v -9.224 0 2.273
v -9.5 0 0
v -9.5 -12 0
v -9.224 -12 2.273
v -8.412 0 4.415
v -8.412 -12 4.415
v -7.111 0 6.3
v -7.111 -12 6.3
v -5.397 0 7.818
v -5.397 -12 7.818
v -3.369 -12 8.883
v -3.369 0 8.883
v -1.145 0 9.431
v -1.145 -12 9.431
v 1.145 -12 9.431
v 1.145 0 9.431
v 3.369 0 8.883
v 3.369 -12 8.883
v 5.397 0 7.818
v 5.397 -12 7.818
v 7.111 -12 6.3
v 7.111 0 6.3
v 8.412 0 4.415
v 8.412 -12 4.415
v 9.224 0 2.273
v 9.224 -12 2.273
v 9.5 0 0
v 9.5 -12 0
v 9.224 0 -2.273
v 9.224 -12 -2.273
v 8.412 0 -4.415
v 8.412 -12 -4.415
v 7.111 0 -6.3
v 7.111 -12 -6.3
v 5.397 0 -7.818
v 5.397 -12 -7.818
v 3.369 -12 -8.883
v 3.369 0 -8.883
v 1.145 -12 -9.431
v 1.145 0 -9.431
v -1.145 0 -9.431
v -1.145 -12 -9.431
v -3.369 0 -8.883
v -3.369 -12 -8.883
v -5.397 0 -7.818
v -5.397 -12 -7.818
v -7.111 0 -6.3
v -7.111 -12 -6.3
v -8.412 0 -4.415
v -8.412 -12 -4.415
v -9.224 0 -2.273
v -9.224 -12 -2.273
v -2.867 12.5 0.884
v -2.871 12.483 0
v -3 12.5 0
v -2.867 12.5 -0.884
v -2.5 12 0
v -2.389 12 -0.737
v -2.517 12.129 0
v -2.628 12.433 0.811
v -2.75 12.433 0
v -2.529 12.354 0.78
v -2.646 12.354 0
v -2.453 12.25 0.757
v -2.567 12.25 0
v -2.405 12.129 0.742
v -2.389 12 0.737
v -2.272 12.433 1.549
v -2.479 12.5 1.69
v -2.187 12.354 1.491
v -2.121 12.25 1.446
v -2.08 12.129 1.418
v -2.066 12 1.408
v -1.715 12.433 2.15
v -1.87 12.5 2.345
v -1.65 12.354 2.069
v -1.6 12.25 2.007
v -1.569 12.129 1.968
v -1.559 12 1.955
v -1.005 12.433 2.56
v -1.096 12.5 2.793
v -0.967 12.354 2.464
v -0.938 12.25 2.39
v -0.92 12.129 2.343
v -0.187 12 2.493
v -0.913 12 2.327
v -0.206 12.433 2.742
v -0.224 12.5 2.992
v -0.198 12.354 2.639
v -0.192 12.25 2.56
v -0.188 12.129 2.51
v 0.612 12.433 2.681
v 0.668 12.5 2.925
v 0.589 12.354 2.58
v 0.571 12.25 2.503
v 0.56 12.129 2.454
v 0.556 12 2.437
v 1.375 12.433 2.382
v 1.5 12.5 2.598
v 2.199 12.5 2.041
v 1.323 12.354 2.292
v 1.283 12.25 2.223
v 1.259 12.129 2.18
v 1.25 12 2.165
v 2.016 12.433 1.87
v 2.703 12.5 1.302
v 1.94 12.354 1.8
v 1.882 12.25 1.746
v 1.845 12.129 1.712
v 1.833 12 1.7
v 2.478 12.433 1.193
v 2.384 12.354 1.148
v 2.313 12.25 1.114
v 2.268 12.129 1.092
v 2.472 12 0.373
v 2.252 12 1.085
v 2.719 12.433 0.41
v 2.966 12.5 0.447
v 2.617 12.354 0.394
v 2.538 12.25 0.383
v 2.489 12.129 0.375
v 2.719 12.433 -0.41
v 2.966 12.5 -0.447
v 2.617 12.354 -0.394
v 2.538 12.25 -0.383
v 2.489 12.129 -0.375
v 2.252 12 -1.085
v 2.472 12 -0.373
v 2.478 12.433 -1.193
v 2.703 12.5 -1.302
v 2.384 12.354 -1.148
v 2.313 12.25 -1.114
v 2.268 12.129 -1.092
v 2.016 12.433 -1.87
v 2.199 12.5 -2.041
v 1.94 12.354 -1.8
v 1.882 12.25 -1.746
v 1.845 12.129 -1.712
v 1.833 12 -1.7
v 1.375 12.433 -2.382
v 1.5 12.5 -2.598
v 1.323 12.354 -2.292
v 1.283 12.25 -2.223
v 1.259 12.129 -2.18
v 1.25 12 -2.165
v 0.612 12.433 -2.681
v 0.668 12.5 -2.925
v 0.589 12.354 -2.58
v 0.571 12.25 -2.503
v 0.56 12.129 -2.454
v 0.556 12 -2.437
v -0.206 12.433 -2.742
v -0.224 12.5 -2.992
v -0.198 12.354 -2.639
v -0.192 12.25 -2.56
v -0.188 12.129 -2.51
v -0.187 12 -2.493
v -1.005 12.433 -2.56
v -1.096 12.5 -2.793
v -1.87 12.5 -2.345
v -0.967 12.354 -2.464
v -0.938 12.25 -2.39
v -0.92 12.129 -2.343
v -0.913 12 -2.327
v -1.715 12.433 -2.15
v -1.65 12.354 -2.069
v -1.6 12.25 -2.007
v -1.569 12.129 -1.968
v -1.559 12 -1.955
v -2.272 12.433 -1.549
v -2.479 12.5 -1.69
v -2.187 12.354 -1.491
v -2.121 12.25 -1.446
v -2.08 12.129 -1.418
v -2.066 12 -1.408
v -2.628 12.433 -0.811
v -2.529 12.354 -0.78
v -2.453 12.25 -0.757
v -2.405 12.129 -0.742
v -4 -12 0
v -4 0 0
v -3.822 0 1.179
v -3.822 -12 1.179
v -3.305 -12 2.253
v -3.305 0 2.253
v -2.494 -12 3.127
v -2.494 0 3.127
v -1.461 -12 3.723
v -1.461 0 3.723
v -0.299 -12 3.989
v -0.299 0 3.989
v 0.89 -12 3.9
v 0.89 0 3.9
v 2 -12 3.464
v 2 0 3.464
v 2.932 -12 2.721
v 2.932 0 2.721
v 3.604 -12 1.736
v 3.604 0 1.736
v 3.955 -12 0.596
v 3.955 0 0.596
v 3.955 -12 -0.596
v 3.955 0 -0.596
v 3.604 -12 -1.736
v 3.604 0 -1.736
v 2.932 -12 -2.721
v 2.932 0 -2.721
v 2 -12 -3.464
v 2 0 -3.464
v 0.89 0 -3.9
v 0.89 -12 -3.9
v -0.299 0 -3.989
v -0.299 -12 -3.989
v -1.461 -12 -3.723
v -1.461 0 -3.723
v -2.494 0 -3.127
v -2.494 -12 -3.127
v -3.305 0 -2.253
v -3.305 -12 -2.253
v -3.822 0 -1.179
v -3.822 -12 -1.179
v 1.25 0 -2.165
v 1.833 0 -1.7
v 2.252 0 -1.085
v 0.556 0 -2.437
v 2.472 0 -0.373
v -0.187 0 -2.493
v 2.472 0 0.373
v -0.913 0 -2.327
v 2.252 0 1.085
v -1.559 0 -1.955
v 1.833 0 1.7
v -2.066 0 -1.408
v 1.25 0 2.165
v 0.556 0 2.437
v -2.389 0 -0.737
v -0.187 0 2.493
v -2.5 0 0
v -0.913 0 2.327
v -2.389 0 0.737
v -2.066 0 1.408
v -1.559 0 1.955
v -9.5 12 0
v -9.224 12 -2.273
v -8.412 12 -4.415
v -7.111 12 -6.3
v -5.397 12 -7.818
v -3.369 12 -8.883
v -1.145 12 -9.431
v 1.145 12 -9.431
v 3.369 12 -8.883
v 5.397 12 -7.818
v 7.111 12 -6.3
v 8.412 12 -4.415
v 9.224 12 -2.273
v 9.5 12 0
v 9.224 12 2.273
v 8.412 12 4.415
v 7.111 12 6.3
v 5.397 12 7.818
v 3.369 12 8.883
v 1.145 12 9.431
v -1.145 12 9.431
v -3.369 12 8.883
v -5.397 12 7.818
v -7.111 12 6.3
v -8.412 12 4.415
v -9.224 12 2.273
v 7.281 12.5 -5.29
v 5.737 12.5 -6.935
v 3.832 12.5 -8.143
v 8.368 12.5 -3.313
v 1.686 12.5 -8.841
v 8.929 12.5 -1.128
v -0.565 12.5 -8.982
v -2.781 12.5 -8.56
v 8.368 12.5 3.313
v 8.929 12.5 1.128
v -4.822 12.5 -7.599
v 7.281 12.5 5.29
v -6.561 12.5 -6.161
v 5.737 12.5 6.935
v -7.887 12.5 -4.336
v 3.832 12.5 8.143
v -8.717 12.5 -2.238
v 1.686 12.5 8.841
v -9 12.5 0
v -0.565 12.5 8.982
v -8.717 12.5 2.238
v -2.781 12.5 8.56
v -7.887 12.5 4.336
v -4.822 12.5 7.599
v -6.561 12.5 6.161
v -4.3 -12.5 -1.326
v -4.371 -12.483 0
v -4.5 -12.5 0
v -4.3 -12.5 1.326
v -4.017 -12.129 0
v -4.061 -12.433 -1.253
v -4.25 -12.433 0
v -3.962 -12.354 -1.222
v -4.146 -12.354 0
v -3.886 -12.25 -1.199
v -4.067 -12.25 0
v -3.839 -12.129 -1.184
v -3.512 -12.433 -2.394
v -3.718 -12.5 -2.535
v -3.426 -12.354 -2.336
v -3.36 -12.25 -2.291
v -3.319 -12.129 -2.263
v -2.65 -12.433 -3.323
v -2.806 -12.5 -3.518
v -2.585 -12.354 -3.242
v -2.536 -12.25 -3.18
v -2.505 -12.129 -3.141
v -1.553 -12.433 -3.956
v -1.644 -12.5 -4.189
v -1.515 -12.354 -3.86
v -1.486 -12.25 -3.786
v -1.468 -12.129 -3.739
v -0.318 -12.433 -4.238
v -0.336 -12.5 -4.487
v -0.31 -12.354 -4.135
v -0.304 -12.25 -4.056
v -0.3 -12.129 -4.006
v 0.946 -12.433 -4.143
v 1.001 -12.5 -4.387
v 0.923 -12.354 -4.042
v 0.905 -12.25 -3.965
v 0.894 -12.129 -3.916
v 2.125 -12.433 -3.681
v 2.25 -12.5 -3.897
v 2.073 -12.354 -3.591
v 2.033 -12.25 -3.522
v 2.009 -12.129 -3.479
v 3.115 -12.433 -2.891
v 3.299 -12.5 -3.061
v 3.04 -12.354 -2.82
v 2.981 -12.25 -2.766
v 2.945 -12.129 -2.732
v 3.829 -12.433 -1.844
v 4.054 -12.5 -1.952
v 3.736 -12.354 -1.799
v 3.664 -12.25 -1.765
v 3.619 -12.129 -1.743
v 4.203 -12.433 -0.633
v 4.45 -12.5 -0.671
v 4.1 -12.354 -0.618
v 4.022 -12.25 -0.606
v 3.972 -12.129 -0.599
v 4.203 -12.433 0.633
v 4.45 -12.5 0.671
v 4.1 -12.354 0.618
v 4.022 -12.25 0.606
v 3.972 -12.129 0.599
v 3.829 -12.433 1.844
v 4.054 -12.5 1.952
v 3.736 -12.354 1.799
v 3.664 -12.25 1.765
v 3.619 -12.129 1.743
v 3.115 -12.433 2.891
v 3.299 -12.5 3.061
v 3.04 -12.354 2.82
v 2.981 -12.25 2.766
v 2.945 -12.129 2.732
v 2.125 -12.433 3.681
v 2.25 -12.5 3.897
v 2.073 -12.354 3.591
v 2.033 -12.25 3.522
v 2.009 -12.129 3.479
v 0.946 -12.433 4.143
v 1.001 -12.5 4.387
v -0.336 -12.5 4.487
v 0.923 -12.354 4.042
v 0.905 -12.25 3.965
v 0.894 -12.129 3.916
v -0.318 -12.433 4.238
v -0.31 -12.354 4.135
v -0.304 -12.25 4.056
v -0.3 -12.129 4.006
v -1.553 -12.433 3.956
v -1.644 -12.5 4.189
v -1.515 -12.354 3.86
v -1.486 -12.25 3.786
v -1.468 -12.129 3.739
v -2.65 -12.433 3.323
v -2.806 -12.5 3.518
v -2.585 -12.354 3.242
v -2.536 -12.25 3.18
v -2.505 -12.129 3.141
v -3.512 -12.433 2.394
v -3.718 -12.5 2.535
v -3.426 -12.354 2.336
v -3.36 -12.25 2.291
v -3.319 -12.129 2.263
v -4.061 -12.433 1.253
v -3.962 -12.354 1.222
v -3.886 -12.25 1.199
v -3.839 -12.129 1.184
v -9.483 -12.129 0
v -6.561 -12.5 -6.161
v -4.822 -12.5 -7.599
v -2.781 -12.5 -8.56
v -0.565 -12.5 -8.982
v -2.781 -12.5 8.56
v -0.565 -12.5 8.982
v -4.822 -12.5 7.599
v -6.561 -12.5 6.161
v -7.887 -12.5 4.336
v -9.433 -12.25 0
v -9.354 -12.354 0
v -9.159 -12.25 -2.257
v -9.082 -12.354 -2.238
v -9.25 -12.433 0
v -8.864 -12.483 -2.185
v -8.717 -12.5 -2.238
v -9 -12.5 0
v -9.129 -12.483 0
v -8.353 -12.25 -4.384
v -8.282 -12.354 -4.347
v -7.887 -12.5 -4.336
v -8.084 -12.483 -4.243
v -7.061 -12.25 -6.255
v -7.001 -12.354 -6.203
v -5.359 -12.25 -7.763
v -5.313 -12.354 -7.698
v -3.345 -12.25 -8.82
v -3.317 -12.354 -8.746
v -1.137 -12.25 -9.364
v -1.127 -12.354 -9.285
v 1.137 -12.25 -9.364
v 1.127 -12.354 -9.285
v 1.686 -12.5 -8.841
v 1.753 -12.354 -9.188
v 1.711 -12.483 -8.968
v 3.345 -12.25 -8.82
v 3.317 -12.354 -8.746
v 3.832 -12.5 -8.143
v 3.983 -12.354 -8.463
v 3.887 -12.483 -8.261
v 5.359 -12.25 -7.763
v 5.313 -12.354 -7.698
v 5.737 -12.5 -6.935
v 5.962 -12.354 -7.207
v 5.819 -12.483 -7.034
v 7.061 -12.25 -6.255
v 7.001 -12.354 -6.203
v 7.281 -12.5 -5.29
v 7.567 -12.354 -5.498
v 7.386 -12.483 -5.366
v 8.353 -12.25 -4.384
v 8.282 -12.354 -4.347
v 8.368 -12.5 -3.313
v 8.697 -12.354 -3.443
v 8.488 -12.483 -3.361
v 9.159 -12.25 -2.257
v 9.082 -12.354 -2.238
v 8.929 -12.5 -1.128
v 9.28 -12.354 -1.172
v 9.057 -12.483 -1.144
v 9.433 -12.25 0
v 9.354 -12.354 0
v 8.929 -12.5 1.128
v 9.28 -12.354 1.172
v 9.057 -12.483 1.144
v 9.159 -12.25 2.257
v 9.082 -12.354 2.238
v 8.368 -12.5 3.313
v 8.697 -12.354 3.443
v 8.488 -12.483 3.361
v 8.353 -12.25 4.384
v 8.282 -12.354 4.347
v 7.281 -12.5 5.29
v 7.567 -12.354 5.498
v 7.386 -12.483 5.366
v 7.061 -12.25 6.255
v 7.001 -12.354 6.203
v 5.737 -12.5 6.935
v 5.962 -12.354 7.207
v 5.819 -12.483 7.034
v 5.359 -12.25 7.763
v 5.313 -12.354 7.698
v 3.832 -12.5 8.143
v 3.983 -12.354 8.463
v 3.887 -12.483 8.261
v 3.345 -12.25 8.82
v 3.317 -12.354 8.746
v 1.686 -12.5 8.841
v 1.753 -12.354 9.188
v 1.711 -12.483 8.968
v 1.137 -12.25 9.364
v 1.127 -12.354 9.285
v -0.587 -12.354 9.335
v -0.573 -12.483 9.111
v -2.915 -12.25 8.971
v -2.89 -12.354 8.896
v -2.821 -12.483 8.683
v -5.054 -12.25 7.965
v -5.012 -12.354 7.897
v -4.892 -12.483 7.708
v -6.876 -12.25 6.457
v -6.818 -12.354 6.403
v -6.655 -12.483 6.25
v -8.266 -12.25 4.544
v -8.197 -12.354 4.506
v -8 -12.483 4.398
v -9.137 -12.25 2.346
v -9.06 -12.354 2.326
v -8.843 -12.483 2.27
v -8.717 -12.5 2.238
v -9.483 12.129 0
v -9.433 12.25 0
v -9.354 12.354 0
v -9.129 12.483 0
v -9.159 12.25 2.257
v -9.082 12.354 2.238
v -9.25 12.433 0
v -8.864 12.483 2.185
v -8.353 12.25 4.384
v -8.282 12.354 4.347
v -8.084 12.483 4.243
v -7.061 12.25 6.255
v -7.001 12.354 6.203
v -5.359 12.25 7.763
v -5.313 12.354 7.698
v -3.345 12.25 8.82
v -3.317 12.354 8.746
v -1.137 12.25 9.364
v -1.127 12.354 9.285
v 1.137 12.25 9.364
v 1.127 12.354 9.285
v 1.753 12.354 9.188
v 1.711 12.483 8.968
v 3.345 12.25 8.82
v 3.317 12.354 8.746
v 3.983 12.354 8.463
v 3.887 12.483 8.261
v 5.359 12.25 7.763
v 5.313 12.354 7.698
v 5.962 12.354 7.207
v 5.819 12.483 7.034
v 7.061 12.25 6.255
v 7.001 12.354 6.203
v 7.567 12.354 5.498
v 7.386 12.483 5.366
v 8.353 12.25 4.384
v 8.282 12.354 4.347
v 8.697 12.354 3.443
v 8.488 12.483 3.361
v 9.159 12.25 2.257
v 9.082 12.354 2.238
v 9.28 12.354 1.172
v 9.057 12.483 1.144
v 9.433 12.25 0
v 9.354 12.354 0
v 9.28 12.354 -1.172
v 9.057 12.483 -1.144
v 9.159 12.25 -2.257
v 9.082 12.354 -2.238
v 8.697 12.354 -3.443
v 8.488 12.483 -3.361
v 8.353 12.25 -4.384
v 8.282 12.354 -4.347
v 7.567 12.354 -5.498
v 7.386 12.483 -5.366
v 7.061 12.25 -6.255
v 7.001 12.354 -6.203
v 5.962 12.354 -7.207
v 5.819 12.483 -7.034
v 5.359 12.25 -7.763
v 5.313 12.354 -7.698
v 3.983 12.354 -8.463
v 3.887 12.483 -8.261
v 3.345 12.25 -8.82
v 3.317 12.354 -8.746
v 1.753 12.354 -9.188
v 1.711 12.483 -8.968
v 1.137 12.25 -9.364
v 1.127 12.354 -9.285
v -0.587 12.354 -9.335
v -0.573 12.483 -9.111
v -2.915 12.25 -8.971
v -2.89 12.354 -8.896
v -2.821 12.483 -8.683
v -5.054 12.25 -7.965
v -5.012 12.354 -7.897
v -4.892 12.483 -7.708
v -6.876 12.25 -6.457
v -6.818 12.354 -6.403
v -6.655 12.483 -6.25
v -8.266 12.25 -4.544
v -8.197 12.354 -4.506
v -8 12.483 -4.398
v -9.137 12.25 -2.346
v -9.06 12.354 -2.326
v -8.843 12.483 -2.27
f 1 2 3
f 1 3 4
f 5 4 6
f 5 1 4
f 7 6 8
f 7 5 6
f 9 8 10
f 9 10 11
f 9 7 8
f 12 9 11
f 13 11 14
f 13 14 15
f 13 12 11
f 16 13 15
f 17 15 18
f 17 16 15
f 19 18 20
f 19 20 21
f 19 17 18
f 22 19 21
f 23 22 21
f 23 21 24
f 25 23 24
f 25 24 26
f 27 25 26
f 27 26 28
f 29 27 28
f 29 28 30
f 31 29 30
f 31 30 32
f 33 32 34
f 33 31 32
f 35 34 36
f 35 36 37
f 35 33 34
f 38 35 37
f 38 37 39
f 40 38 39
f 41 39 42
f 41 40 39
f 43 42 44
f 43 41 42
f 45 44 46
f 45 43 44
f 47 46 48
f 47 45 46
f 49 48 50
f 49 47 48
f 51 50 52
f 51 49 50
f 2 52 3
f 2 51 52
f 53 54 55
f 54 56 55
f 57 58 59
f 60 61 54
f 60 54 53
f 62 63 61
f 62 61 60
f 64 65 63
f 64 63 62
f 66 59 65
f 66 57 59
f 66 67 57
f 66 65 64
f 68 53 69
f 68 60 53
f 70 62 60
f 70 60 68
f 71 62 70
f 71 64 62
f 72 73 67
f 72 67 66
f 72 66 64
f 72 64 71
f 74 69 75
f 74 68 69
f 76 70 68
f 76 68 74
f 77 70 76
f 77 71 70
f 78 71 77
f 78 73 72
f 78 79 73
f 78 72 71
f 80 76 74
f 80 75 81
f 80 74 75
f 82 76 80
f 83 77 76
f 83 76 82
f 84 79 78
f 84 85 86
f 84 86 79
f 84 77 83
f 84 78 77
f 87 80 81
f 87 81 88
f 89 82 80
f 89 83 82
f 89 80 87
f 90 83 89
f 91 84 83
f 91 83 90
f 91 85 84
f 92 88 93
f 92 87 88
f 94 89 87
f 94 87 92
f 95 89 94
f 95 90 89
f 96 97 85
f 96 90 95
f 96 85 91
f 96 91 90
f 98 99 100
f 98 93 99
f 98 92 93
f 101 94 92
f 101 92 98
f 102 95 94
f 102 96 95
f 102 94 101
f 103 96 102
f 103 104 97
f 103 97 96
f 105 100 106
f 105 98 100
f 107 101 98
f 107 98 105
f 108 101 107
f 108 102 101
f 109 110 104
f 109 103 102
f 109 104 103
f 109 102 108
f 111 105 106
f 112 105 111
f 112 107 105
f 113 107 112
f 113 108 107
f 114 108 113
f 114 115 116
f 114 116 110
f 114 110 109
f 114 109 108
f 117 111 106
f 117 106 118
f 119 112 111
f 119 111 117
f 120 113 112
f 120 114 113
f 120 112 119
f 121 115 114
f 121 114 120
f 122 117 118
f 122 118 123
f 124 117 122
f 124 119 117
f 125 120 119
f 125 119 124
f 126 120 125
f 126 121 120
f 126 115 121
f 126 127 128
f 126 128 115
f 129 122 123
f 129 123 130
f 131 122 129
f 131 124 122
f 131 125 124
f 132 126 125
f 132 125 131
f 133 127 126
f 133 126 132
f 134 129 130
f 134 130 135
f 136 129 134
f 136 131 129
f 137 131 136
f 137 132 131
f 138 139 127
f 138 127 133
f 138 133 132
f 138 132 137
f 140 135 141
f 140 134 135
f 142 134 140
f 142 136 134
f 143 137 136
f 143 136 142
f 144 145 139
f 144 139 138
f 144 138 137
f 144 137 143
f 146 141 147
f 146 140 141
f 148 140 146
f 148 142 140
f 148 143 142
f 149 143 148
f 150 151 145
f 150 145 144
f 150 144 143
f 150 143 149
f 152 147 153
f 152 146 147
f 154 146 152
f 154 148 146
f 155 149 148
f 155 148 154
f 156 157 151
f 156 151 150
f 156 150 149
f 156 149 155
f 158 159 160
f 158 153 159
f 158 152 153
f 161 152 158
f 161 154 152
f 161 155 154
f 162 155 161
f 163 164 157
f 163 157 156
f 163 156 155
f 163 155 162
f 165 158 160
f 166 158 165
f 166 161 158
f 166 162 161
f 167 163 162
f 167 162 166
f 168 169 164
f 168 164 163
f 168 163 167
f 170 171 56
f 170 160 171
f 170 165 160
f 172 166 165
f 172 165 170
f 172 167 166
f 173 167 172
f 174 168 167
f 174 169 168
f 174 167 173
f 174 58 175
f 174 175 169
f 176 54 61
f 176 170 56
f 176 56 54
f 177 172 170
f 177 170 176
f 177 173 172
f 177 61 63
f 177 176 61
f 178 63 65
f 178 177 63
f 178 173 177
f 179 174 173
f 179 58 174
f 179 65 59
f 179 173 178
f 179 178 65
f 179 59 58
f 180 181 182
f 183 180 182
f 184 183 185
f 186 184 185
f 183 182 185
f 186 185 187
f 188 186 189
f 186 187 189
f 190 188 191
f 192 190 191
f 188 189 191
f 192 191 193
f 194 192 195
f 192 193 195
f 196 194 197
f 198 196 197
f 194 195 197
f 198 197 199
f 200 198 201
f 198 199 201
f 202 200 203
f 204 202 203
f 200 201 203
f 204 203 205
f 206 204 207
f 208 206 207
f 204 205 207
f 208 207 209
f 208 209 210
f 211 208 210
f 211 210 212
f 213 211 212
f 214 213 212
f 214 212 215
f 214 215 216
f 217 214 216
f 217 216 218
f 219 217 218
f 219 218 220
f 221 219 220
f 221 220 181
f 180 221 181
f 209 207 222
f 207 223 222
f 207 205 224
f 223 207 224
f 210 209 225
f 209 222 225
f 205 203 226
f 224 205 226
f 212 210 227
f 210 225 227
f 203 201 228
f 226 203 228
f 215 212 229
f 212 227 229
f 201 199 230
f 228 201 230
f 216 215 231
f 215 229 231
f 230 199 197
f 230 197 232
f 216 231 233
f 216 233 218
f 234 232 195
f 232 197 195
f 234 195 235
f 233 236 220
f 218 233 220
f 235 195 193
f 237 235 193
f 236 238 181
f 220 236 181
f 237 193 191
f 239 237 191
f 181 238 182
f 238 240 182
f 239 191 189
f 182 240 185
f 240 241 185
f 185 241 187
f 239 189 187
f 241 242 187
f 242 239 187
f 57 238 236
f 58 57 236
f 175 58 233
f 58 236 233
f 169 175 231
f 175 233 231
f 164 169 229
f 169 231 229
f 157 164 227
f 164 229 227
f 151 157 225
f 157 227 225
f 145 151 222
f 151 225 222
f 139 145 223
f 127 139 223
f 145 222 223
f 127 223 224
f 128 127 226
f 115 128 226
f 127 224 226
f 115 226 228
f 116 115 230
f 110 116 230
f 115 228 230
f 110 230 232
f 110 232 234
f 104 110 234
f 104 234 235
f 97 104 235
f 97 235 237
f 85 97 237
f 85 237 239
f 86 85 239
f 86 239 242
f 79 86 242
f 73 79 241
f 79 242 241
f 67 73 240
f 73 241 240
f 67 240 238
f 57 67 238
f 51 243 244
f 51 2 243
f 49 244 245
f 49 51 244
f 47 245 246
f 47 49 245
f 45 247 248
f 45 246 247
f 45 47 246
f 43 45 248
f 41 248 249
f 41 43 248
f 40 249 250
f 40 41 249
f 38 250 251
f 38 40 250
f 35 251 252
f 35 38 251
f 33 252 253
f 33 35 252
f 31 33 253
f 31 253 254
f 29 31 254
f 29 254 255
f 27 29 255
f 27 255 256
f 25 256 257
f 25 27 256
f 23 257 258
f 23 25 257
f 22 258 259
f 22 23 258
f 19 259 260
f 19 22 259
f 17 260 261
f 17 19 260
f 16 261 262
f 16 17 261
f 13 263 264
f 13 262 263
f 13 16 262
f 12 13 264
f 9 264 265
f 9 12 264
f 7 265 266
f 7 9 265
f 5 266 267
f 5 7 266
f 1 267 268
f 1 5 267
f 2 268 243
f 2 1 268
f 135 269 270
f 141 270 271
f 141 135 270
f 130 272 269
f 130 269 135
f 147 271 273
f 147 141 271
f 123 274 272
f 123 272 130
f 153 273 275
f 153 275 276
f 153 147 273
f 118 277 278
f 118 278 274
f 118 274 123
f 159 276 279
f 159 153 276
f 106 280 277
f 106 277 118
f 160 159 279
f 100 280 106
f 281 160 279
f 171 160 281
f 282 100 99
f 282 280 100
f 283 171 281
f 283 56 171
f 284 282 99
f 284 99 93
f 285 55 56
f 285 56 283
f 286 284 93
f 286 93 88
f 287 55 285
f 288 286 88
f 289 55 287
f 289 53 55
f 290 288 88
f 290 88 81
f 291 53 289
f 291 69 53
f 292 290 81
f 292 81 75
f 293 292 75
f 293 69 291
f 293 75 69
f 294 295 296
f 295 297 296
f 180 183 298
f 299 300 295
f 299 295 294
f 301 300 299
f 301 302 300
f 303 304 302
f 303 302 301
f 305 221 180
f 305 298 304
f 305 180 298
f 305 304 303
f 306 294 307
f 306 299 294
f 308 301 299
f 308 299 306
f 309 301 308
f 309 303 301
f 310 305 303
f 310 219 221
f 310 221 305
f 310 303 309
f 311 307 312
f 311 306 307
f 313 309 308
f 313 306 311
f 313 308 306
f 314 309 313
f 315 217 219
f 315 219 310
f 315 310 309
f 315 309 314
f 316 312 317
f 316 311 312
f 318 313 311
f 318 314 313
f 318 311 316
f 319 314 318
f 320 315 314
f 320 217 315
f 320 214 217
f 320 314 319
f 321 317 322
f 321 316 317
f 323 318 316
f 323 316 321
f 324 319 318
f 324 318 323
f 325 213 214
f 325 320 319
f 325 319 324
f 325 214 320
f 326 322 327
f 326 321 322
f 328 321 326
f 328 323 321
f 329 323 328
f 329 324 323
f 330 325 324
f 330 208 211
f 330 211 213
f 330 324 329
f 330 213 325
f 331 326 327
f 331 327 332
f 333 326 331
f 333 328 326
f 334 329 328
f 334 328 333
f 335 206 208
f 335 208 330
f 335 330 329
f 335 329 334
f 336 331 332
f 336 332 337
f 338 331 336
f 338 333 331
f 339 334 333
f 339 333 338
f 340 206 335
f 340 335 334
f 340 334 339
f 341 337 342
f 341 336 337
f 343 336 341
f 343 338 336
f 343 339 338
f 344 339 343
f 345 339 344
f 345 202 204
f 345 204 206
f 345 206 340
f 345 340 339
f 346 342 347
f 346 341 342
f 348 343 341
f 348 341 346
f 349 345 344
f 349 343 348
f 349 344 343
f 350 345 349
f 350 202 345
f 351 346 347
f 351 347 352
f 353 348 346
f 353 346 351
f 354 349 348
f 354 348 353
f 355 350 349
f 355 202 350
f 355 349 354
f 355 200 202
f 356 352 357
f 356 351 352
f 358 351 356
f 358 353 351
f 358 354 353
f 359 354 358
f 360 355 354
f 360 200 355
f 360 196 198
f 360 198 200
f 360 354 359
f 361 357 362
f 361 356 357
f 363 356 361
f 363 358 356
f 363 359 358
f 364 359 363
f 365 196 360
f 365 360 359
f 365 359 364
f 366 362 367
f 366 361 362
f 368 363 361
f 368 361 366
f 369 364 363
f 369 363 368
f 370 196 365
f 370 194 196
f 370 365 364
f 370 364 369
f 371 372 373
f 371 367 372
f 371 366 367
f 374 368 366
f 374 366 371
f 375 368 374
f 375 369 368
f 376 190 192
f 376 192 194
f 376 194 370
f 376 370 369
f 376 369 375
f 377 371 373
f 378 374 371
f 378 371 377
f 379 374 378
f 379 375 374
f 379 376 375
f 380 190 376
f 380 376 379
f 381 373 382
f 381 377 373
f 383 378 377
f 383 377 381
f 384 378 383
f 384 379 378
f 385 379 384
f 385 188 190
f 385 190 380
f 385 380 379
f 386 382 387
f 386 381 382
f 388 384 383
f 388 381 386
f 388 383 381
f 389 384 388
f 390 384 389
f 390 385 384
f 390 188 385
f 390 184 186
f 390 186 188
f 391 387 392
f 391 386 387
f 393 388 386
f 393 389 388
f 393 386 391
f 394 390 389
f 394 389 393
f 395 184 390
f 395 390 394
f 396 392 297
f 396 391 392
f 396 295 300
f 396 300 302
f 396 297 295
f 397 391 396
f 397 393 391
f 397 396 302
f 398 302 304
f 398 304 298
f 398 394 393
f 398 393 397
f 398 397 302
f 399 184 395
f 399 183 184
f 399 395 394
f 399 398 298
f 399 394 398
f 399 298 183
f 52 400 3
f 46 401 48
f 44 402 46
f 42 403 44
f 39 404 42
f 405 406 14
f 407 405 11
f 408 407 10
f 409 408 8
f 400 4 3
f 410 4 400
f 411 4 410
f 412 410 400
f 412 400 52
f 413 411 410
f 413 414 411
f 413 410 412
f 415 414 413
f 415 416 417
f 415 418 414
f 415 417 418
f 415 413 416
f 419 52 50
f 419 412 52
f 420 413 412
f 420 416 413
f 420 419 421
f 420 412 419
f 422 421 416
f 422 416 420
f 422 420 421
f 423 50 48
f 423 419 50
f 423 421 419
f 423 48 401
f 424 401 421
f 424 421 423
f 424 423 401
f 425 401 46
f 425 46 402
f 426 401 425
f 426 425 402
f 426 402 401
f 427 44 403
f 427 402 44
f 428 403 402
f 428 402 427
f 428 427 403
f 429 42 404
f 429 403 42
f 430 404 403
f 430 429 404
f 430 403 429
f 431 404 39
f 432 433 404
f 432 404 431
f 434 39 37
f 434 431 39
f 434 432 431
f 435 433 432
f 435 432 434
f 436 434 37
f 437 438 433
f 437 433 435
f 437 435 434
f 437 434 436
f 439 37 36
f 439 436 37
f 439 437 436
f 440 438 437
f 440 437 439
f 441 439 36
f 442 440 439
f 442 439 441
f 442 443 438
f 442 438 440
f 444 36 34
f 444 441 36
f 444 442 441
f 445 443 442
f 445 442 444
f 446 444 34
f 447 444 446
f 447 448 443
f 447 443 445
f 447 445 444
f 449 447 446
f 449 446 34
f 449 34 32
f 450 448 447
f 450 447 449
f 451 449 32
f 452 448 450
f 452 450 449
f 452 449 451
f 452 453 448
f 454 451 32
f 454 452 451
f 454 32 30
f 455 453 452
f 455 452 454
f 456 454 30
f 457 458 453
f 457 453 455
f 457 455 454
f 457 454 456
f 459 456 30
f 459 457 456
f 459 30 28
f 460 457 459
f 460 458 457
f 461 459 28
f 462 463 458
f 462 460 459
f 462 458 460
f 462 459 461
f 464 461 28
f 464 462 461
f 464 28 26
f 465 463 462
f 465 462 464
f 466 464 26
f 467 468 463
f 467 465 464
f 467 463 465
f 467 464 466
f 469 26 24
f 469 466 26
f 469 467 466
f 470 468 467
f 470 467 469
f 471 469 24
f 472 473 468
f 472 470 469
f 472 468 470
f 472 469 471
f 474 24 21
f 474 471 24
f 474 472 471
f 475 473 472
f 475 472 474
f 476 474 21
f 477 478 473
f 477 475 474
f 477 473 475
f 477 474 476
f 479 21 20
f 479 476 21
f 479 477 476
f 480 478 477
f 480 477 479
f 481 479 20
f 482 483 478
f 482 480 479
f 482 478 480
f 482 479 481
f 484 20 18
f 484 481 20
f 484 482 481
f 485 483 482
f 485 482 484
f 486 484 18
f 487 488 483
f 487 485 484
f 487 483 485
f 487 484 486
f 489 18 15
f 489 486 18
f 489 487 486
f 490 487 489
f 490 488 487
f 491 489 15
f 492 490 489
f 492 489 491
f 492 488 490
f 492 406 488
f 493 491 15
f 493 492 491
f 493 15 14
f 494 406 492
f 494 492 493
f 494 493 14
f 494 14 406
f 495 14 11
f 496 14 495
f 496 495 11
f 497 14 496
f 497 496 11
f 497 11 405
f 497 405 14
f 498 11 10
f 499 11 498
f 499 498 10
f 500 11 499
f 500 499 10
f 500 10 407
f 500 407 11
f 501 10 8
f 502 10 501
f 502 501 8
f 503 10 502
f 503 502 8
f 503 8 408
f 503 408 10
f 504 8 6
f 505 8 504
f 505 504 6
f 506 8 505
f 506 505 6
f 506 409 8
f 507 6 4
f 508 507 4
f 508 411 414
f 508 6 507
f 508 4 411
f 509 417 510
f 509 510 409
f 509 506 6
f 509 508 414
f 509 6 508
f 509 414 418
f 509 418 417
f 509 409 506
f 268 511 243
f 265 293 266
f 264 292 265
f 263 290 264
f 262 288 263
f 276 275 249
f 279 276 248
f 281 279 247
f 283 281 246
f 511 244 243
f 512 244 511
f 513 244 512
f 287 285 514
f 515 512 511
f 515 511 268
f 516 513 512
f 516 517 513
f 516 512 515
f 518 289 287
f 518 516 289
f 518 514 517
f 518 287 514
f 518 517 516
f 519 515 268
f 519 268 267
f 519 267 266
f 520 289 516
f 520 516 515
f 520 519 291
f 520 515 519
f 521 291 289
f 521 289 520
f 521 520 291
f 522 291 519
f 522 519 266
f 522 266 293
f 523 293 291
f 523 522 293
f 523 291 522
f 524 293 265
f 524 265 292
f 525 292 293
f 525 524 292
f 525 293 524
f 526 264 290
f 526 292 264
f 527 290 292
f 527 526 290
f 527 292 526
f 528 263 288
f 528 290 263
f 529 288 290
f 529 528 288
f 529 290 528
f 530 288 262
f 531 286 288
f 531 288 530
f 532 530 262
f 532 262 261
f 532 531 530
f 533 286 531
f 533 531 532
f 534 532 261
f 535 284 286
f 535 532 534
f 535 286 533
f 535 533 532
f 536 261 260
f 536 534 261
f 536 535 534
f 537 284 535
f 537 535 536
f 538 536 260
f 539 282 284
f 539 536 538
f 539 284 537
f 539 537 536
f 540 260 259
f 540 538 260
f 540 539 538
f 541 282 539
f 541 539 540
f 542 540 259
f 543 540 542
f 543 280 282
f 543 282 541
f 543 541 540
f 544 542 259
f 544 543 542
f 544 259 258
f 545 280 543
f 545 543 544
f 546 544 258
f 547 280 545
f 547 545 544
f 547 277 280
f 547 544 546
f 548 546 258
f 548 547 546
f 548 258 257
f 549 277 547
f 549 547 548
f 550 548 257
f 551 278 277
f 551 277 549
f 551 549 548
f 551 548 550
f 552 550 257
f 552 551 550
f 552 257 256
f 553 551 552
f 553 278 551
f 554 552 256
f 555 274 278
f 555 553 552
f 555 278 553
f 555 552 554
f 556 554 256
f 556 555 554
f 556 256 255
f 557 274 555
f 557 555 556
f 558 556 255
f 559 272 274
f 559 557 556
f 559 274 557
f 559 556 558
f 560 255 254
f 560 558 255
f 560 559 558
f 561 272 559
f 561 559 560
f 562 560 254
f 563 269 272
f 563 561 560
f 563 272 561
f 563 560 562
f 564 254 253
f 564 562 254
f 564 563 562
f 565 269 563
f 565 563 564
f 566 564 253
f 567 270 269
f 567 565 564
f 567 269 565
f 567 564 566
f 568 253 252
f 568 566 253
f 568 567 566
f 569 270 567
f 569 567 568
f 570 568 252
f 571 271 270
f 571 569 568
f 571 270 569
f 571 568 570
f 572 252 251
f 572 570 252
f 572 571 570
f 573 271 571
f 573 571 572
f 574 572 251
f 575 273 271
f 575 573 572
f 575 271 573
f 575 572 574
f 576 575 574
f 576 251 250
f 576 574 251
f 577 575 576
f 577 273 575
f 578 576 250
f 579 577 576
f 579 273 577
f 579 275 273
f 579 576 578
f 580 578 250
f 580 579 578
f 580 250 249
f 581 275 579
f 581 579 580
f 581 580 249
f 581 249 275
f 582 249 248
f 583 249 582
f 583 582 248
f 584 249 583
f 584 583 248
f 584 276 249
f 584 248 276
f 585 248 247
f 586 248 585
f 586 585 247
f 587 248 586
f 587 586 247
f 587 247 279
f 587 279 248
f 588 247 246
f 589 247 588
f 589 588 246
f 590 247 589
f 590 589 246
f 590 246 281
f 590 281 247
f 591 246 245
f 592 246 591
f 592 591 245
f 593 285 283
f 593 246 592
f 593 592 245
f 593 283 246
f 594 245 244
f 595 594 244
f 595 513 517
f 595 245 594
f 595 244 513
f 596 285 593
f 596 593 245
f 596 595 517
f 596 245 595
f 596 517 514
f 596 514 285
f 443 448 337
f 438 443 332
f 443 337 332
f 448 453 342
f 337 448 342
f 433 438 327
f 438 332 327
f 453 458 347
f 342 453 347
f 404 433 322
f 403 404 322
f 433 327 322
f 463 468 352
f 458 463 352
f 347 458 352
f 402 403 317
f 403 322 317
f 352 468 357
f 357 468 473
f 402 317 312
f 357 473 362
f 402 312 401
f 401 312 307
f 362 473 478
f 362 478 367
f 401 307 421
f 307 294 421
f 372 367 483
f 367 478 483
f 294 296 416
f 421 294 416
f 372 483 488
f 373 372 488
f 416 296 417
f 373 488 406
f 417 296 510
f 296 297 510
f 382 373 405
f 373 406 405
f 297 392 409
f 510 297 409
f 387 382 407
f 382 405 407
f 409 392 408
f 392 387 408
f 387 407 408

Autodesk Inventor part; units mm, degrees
ref_plane "YZ Plane" through (0, 0, 0) normal (1, 0, 0) x (0, 1, 0)
ref_plane "XZ Plane" through (0, 0, 0) normal (0, 1, 0) x (-1, 0, 0)
ref_plane "XY Plane" through (0, 0, 0) normal (0, 0, 1) x (1, 0, 0)
sketch "Sketch1" plane through (0, 0, 0) normal (0, 1, 0) x (-1, 0, 0)
  circle A0 centre (0, 0) radius 9.5
  dimension "d0" = 19
extrude "Extrusion1" add sketch "Sketch1" along normal mid plane 25
sketch "Sketch2" plane through (0, 0, 0) normal (0, 1, 0) x (-1, 0, 0)
  circle A0 centre (0, 0) radius 4
  circle A1 centre (0, 0) radius 2.5
  dimension "d3" = 8
  dimension "d4" = 5
extrude "Extrusion2" cut sketch "Sketch2" against normal blind 25 contours A0 | A1
extrude "Extrusion3" cut sketch "Sketch2" along normal blind 25 contours A1
fillet "Fillet1" radius 0.5 4 edges at (9.5, 12.5, 0) (9.5, -12.5, 0) (2.5, 12.5, 0) (4, -12.5, 0)
properties part number "Flx_Al_Coupling(5_8mm)"
